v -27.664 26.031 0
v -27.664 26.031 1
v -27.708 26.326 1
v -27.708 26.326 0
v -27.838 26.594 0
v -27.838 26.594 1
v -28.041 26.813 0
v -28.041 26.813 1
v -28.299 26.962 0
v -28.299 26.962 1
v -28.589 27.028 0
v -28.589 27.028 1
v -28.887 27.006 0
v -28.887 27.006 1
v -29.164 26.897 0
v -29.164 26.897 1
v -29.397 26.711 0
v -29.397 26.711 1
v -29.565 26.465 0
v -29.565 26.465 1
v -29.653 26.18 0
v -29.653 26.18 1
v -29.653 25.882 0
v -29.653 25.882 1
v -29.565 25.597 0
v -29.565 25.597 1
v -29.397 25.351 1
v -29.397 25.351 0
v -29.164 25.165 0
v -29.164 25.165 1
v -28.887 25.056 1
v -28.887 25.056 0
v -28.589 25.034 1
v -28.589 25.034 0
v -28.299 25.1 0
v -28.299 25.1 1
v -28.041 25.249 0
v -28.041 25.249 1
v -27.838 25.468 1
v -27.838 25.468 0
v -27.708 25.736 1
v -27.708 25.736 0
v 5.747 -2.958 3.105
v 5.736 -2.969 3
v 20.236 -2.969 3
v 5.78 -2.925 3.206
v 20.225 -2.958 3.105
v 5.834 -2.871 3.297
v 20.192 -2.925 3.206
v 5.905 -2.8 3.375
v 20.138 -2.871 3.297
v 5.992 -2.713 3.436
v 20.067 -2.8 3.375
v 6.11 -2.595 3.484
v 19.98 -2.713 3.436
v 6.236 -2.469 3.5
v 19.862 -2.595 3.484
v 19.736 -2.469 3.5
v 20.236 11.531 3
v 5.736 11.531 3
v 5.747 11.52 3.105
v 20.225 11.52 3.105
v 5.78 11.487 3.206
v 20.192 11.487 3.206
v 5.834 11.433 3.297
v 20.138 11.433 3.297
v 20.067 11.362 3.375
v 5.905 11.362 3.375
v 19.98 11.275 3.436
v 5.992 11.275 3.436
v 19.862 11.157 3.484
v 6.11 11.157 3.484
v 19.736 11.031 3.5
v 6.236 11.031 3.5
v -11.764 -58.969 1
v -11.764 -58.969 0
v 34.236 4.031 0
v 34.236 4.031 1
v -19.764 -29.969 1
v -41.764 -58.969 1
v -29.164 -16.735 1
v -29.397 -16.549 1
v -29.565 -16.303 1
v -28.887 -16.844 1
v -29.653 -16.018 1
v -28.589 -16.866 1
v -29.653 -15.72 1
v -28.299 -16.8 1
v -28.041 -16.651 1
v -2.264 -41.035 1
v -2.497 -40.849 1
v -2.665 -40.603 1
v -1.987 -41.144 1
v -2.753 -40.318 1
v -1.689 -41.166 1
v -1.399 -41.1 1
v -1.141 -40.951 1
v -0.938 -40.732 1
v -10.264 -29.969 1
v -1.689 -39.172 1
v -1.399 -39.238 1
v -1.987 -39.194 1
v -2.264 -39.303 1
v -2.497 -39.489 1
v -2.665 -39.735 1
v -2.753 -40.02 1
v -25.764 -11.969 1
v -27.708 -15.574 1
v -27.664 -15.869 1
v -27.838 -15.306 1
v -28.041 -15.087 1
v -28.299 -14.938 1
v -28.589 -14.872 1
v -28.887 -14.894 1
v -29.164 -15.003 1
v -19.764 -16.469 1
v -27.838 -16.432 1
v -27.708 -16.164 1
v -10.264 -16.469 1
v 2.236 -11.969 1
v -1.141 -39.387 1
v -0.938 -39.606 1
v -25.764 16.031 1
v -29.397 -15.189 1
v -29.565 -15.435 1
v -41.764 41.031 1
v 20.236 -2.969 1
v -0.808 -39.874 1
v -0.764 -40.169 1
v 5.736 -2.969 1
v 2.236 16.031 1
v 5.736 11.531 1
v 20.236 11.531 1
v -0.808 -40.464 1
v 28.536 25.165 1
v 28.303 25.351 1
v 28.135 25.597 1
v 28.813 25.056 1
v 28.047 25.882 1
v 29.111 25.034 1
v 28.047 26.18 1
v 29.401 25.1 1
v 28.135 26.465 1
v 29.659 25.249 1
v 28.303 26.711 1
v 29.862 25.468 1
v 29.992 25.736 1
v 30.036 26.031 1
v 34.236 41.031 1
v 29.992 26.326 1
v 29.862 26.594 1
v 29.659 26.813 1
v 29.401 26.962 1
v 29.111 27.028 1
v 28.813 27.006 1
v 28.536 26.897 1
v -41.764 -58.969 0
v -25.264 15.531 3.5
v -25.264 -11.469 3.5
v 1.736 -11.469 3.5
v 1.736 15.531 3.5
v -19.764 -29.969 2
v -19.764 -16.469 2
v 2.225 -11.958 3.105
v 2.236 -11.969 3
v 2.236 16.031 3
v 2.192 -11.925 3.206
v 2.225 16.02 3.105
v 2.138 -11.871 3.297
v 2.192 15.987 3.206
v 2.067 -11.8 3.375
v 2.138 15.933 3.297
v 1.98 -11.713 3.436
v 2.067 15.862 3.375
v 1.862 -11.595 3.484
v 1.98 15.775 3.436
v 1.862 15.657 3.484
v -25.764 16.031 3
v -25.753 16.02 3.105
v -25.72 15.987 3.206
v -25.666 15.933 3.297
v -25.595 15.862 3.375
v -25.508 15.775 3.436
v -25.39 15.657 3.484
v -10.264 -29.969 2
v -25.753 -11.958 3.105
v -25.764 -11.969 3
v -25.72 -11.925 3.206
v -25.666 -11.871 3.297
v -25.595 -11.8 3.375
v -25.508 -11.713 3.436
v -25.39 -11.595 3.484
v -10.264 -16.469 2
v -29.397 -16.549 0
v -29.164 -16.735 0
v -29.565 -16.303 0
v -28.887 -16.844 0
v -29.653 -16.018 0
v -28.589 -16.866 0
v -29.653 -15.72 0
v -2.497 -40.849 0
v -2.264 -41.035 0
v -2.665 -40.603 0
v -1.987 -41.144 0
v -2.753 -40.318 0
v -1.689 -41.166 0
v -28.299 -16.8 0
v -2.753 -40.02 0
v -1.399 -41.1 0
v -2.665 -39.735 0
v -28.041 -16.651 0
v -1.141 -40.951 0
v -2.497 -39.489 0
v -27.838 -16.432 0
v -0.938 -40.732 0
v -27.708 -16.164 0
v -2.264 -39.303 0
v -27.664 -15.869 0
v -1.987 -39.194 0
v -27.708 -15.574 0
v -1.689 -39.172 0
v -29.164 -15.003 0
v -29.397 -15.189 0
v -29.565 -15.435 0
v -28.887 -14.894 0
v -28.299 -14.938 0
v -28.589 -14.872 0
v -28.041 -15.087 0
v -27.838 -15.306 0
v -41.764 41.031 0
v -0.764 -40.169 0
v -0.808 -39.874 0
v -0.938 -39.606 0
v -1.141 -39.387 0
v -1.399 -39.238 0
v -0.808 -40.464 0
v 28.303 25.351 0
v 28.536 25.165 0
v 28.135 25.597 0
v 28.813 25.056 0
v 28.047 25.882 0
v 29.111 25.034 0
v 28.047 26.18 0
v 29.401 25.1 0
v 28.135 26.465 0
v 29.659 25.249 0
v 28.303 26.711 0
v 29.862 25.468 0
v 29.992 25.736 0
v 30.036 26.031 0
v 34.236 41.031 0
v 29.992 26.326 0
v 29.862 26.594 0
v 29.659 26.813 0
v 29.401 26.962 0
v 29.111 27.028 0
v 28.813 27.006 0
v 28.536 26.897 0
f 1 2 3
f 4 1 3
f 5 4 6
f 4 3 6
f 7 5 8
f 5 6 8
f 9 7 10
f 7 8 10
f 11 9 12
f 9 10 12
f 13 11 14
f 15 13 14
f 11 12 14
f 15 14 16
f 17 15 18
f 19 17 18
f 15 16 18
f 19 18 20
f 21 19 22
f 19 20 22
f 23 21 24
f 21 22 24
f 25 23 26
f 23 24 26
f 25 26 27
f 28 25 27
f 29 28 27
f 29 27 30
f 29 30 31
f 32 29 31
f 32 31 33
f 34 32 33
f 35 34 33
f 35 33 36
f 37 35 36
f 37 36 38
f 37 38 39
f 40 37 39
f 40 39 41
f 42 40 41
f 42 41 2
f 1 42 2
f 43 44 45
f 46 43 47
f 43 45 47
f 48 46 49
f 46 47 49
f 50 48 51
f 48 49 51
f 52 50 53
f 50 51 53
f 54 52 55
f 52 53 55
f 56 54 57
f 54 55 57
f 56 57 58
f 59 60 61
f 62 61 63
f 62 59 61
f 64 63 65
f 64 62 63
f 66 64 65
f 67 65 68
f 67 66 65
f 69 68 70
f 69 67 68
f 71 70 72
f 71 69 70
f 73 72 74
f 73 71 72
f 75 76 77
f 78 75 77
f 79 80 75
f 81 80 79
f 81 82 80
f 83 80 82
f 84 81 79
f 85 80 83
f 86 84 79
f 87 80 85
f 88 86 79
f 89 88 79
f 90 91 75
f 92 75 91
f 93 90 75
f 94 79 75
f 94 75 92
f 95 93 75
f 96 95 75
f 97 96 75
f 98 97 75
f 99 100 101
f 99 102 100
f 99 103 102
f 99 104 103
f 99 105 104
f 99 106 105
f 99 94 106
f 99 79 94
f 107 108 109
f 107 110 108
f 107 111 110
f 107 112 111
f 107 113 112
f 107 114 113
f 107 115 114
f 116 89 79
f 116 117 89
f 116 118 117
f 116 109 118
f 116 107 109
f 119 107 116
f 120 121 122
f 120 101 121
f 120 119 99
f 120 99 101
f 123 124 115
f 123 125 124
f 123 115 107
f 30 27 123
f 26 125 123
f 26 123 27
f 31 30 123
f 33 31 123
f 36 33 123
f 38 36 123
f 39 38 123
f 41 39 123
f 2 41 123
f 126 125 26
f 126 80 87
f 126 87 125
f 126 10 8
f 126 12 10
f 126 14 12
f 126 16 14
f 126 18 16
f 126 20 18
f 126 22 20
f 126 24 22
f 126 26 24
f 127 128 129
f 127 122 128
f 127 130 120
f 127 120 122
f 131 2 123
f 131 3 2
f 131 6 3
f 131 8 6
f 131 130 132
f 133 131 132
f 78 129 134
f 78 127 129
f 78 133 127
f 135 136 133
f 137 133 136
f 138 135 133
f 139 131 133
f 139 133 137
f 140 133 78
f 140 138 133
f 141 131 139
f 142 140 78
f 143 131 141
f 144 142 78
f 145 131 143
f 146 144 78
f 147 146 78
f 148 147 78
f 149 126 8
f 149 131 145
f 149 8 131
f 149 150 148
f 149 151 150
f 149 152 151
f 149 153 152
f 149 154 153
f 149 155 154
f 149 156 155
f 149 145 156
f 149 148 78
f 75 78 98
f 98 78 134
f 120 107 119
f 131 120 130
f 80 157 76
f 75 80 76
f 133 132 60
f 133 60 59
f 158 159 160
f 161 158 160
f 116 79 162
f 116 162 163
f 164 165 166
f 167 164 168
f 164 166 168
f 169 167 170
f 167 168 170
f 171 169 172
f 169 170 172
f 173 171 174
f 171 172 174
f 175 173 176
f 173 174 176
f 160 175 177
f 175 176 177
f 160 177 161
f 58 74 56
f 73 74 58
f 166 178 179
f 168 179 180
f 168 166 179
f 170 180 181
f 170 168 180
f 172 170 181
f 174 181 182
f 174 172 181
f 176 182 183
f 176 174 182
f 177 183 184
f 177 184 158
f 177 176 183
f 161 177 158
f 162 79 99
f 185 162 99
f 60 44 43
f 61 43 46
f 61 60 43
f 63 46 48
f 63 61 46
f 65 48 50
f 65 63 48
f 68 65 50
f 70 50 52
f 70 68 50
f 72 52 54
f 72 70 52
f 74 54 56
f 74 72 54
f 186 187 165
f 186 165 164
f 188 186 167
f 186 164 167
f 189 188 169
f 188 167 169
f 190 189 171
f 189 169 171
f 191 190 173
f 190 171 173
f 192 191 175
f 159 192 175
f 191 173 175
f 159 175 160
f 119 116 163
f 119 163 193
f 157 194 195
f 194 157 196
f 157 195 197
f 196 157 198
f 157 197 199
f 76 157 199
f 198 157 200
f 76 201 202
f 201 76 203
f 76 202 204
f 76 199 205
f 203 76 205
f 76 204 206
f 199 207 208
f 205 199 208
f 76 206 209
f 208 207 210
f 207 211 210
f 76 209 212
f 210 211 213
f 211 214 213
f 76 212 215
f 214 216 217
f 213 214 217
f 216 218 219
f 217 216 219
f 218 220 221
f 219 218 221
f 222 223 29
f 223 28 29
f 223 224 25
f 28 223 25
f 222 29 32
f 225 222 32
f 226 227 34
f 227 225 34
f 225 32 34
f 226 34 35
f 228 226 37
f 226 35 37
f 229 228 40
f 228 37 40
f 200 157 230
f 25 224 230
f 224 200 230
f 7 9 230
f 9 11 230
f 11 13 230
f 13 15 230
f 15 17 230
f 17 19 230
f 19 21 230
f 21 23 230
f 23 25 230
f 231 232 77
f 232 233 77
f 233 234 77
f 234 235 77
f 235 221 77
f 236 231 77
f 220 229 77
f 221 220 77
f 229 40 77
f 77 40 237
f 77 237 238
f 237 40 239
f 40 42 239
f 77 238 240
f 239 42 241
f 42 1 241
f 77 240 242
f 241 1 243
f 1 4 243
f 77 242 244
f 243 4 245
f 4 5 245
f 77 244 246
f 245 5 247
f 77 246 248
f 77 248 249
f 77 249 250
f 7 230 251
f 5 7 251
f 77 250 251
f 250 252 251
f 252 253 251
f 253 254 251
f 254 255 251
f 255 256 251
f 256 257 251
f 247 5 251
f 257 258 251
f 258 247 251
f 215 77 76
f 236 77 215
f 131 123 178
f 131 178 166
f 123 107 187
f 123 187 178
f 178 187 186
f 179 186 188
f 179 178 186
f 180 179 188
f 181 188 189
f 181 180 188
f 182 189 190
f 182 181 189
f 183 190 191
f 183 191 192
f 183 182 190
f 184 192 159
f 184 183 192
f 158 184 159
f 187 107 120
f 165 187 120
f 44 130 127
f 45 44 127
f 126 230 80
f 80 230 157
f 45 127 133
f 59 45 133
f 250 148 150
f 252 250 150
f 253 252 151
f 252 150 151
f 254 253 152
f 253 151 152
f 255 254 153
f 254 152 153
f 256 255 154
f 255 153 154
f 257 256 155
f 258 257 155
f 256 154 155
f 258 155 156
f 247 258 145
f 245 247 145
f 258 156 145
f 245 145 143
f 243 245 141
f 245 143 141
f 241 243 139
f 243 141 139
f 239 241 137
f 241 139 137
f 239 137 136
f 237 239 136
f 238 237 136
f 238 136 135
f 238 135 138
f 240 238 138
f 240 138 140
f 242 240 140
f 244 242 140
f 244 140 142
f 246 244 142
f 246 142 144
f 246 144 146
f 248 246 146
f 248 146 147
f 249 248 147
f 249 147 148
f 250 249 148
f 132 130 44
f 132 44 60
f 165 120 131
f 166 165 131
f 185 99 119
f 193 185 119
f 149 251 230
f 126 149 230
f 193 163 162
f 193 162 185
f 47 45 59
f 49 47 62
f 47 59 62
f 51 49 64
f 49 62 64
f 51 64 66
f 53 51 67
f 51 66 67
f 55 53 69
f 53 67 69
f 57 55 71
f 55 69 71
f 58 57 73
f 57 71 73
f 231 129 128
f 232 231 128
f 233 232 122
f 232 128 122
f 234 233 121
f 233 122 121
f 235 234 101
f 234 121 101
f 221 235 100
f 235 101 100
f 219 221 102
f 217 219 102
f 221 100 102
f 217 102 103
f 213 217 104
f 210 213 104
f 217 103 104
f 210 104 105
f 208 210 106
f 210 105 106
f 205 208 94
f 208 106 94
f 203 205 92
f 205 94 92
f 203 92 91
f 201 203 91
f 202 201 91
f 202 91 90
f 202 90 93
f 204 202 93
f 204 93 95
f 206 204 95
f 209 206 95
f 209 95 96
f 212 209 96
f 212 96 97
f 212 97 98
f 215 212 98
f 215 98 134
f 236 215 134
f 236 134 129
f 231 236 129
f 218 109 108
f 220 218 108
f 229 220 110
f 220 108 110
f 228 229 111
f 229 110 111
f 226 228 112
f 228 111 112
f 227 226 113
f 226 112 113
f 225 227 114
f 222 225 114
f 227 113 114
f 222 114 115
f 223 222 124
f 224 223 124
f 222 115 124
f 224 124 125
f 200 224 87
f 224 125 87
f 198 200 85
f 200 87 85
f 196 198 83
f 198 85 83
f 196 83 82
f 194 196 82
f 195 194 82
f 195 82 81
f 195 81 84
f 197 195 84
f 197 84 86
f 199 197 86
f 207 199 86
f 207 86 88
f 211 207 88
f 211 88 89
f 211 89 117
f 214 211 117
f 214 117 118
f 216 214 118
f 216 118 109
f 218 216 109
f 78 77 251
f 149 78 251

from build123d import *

# Parameters (mm, degrees)
F1_DEPTH = 1
F2_R     = 1
F3_DEPTH = 2
F4_W     = 28
F4_H     = 28
F4_W_2   = 14.5
F4_H_2   = 14.5
F5_DEPTH = 2.5
F6_R     = 0.5
F7_W     = 9.5
F7_H     = 13.5
F8_DEPTH = 1


with BuildPart() as f1:
    # F0 (on Top) → F1 (new body)
    with BuildSketch(Plane.XY):
        Polygon((-41.764005, 41.031135), (-41.764005, -58.968865), (-11.764005, -58.968865), (34.235995, 4.031135), (34.235995, 41.031135), align=None)
    extrude(amount=F1_DEPTH)

    # F2 (on face) → F3 (cut)
    with BuildSketch(Plane.XY.offset(1)):
        with Locations((-28.664005, 26.031135)):
            Circle(F2_R)
        with Locations((-28.664005, -15.868865)):
            Circle(F2_R)
        with Locations((29.035995, 26.031135)):
            Circle(F2_R)
        with Locations((-1.764005, -40.168865)):
            Circle(F2_R)
    extrude(amount=-F3_DEPTH, mode=Mode.SUBTRACT)

    # F4 (on face) → F5 (join)
    with BuildSketch(Plane.XY.offset(1)):
        with Locations((-11.764005, 2.031135)):
            Rectangle(F4_W, F4_H)
        with Locations((12.985995, 4.281135)):
            Rectangle(F4_W_2, F4_H_2)
    extrude(amount=F5_DEPTH)

    # F6
    f6_edges = [f1.edges().sort_by_distance(p)[0] for p in [
        (-11.764005, -11.968865, 3.5),
        (-25.764005, 2.031135, 3.5),
        (-11.764005, 16.031135, 3.5),
        (2.235995, 2.031135, 3.5),
        (12.985995, 11.531135, 3.5),
        (5.735995, 4.281135, 3.5),
        (12.985995, -2.968865, 3.5),
        (20.235995, 4.281135, 3.5),
    ]]
    fillet(f6_edges, radius=F6_R)

    # F7 (on face) → F8 (join)
    with BuildSketch(Plane.XY.offset(1)):
        with Locations((-15.014005, -23.218865)):
            Rectangle(F7_W, F7_H)
    extrude(amount=F8_DEPTH)


solid = f1.part
